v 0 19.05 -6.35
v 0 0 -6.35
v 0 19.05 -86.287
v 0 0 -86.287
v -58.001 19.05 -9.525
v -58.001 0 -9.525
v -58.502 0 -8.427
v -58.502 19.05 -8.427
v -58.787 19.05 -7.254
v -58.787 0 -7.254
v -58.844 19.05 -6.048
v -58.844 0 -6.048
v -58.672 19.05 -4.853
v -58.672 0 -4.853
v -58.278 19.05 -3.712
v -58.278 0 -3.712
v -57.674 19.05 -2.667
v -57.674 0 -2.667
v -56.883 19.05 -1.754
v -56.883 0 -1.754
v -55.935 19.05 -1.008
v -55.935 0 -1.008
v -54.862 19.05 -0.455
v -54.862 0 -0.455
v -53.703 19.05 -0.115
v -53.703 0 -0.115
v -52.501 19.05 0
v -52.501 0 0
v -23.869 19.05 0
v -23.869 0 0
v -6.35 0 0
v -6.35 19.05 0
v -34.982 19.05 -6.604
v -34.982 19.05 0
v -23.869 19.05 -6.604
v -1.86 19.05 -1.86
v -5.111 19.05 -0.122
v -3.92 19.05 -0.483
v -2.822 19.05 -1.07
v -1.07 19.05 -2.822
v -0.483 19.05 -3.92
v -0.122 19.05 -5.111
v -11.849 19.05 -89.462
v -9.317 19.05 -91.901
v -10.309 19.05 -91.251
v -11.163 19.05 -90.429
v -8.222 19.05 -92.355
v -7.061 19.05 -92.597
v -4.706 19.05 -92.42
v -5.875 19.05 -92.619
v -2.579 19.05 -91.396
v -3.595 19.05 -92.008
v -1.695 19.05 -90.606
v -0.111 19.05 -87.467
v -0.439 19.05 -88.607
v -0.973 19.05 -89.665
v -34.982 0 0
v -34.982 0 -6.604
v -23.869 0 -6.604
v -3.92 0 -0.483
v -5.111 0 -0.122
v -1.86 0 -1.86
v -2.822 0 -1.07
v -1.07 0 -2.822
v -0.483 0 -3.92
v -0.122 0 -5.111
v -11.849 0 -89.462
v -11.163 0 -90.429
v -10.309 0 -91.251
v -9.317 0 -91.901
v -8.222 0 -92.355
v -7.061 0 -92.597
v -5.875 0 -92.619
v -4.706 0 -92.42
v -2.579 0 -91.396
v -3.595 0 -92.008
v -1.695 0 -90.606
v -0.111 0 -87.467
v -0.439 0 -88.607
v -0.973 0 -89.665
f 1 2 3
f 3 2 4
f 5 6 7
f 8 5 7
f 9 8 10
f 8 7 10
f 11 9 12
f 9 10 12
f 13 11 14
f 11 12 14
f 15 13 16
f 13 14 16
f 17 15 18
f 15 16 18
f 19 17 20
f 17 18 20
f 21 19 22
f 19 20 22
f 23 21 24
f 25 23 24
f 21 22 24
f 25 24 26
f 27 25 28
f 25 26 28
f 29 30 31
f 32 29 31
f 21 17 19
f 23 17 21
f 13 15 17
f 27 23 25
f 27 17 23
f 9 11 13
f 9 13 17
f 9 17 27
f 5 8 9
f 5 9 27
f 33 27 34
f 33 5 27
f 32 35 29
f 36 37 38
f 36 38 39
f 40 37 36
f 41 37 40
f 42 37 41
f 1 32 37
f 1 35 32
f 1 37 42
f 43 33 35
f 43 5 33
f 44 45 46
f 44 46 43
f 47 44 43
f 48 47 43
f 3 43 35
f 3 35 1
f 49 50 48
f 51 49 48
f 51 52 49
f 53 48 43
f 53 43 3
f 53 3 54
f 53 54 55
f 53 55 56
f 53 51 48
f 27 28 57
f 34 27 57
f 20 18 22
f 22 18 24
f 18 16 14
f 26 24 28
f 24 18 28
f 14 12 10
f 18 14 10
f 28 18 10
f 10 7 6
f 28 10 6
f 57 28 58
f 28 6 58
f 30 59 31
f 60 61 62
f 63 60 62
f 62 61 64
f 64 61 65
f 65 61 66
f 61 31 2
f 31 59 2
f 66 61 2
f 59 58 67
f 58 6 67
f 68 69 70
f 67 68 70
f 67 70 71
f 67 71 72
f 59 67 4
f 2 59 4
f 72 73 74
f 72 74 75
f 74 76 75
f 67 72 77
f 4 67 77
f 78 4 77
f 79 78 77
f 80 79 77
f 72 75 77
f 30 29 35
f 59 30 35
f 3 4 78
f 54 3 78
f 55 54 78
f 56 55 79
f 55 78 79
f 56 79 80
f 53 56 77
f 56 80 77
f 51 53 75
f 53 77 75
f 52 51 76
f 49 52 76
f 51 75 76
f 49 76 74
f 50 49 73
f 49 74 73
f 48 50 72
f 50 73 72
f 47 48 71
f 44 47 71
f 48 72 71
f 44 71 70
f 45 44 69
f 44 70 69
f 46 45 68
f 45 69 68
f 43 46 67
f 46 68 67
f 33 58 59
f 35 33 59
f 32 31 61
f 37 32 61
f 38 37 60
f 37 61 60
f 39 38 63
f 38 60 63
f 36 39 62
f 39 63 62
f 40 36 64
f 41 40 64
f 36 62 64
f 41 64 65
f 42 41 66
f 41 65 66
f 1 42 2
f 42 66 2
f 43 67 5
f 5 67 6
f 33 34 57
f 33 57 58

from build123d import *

# Parameters (mm, degrees)
BOSS_EXTRUDE1_DEPTH = 19.05
SKETCH2_W           = 11.1125
SKETCH2_H           = 6.604
CUT_EXTRUDE1_DEPTH  = 112.391012889


with BuildPart() as part:
    # Sketch1 → Boss-Extrude1 (new body)
    with BuildSketch(Plane(origin=(0, 0, 0), x_dir=(1, 0, 0), z_dir=(0, 1, 0))):
        with BuildLine():
            Line((0, 6.35), (0, 86.286703653))
            ThreePointArc((0, 86.286703653), (-4.706499064, 92.420332649), (-11.849261314, 89.461703653))
            Line((-11.849261314, 89.461703653), (-58.000738686, 9.525))
            ThreePointArc((-58.000738686, 9.525), (-58.000738686, 3.175), (-52.501477372, 0))
            Line((-52.501477372, 0), (-6.35, 0))
            ThreePointArc((-6.35, 0), (-1.859871939, 1.859871939), (0, 6.35))
        make_face()
    extrude(amount=BOSS_EXTRUDE1_DEPTH)

    # Sketch2 → Cut-Extrude1 (cut, through all)
    with BuildSketch(Plane(origin=(0, 19.05, 0), x_dir=(1, 0, 0), z_dir=(0, 1, 0))):
        with Locations((-29.425738686, 3.302)):
            Rectangle(SKETCH2_W, SKETCH2_H)
    extrude(amount=-CUT_EXTRUDE1_DEPTH, mode=Mode.SUBTRACT)


solid = part.part
